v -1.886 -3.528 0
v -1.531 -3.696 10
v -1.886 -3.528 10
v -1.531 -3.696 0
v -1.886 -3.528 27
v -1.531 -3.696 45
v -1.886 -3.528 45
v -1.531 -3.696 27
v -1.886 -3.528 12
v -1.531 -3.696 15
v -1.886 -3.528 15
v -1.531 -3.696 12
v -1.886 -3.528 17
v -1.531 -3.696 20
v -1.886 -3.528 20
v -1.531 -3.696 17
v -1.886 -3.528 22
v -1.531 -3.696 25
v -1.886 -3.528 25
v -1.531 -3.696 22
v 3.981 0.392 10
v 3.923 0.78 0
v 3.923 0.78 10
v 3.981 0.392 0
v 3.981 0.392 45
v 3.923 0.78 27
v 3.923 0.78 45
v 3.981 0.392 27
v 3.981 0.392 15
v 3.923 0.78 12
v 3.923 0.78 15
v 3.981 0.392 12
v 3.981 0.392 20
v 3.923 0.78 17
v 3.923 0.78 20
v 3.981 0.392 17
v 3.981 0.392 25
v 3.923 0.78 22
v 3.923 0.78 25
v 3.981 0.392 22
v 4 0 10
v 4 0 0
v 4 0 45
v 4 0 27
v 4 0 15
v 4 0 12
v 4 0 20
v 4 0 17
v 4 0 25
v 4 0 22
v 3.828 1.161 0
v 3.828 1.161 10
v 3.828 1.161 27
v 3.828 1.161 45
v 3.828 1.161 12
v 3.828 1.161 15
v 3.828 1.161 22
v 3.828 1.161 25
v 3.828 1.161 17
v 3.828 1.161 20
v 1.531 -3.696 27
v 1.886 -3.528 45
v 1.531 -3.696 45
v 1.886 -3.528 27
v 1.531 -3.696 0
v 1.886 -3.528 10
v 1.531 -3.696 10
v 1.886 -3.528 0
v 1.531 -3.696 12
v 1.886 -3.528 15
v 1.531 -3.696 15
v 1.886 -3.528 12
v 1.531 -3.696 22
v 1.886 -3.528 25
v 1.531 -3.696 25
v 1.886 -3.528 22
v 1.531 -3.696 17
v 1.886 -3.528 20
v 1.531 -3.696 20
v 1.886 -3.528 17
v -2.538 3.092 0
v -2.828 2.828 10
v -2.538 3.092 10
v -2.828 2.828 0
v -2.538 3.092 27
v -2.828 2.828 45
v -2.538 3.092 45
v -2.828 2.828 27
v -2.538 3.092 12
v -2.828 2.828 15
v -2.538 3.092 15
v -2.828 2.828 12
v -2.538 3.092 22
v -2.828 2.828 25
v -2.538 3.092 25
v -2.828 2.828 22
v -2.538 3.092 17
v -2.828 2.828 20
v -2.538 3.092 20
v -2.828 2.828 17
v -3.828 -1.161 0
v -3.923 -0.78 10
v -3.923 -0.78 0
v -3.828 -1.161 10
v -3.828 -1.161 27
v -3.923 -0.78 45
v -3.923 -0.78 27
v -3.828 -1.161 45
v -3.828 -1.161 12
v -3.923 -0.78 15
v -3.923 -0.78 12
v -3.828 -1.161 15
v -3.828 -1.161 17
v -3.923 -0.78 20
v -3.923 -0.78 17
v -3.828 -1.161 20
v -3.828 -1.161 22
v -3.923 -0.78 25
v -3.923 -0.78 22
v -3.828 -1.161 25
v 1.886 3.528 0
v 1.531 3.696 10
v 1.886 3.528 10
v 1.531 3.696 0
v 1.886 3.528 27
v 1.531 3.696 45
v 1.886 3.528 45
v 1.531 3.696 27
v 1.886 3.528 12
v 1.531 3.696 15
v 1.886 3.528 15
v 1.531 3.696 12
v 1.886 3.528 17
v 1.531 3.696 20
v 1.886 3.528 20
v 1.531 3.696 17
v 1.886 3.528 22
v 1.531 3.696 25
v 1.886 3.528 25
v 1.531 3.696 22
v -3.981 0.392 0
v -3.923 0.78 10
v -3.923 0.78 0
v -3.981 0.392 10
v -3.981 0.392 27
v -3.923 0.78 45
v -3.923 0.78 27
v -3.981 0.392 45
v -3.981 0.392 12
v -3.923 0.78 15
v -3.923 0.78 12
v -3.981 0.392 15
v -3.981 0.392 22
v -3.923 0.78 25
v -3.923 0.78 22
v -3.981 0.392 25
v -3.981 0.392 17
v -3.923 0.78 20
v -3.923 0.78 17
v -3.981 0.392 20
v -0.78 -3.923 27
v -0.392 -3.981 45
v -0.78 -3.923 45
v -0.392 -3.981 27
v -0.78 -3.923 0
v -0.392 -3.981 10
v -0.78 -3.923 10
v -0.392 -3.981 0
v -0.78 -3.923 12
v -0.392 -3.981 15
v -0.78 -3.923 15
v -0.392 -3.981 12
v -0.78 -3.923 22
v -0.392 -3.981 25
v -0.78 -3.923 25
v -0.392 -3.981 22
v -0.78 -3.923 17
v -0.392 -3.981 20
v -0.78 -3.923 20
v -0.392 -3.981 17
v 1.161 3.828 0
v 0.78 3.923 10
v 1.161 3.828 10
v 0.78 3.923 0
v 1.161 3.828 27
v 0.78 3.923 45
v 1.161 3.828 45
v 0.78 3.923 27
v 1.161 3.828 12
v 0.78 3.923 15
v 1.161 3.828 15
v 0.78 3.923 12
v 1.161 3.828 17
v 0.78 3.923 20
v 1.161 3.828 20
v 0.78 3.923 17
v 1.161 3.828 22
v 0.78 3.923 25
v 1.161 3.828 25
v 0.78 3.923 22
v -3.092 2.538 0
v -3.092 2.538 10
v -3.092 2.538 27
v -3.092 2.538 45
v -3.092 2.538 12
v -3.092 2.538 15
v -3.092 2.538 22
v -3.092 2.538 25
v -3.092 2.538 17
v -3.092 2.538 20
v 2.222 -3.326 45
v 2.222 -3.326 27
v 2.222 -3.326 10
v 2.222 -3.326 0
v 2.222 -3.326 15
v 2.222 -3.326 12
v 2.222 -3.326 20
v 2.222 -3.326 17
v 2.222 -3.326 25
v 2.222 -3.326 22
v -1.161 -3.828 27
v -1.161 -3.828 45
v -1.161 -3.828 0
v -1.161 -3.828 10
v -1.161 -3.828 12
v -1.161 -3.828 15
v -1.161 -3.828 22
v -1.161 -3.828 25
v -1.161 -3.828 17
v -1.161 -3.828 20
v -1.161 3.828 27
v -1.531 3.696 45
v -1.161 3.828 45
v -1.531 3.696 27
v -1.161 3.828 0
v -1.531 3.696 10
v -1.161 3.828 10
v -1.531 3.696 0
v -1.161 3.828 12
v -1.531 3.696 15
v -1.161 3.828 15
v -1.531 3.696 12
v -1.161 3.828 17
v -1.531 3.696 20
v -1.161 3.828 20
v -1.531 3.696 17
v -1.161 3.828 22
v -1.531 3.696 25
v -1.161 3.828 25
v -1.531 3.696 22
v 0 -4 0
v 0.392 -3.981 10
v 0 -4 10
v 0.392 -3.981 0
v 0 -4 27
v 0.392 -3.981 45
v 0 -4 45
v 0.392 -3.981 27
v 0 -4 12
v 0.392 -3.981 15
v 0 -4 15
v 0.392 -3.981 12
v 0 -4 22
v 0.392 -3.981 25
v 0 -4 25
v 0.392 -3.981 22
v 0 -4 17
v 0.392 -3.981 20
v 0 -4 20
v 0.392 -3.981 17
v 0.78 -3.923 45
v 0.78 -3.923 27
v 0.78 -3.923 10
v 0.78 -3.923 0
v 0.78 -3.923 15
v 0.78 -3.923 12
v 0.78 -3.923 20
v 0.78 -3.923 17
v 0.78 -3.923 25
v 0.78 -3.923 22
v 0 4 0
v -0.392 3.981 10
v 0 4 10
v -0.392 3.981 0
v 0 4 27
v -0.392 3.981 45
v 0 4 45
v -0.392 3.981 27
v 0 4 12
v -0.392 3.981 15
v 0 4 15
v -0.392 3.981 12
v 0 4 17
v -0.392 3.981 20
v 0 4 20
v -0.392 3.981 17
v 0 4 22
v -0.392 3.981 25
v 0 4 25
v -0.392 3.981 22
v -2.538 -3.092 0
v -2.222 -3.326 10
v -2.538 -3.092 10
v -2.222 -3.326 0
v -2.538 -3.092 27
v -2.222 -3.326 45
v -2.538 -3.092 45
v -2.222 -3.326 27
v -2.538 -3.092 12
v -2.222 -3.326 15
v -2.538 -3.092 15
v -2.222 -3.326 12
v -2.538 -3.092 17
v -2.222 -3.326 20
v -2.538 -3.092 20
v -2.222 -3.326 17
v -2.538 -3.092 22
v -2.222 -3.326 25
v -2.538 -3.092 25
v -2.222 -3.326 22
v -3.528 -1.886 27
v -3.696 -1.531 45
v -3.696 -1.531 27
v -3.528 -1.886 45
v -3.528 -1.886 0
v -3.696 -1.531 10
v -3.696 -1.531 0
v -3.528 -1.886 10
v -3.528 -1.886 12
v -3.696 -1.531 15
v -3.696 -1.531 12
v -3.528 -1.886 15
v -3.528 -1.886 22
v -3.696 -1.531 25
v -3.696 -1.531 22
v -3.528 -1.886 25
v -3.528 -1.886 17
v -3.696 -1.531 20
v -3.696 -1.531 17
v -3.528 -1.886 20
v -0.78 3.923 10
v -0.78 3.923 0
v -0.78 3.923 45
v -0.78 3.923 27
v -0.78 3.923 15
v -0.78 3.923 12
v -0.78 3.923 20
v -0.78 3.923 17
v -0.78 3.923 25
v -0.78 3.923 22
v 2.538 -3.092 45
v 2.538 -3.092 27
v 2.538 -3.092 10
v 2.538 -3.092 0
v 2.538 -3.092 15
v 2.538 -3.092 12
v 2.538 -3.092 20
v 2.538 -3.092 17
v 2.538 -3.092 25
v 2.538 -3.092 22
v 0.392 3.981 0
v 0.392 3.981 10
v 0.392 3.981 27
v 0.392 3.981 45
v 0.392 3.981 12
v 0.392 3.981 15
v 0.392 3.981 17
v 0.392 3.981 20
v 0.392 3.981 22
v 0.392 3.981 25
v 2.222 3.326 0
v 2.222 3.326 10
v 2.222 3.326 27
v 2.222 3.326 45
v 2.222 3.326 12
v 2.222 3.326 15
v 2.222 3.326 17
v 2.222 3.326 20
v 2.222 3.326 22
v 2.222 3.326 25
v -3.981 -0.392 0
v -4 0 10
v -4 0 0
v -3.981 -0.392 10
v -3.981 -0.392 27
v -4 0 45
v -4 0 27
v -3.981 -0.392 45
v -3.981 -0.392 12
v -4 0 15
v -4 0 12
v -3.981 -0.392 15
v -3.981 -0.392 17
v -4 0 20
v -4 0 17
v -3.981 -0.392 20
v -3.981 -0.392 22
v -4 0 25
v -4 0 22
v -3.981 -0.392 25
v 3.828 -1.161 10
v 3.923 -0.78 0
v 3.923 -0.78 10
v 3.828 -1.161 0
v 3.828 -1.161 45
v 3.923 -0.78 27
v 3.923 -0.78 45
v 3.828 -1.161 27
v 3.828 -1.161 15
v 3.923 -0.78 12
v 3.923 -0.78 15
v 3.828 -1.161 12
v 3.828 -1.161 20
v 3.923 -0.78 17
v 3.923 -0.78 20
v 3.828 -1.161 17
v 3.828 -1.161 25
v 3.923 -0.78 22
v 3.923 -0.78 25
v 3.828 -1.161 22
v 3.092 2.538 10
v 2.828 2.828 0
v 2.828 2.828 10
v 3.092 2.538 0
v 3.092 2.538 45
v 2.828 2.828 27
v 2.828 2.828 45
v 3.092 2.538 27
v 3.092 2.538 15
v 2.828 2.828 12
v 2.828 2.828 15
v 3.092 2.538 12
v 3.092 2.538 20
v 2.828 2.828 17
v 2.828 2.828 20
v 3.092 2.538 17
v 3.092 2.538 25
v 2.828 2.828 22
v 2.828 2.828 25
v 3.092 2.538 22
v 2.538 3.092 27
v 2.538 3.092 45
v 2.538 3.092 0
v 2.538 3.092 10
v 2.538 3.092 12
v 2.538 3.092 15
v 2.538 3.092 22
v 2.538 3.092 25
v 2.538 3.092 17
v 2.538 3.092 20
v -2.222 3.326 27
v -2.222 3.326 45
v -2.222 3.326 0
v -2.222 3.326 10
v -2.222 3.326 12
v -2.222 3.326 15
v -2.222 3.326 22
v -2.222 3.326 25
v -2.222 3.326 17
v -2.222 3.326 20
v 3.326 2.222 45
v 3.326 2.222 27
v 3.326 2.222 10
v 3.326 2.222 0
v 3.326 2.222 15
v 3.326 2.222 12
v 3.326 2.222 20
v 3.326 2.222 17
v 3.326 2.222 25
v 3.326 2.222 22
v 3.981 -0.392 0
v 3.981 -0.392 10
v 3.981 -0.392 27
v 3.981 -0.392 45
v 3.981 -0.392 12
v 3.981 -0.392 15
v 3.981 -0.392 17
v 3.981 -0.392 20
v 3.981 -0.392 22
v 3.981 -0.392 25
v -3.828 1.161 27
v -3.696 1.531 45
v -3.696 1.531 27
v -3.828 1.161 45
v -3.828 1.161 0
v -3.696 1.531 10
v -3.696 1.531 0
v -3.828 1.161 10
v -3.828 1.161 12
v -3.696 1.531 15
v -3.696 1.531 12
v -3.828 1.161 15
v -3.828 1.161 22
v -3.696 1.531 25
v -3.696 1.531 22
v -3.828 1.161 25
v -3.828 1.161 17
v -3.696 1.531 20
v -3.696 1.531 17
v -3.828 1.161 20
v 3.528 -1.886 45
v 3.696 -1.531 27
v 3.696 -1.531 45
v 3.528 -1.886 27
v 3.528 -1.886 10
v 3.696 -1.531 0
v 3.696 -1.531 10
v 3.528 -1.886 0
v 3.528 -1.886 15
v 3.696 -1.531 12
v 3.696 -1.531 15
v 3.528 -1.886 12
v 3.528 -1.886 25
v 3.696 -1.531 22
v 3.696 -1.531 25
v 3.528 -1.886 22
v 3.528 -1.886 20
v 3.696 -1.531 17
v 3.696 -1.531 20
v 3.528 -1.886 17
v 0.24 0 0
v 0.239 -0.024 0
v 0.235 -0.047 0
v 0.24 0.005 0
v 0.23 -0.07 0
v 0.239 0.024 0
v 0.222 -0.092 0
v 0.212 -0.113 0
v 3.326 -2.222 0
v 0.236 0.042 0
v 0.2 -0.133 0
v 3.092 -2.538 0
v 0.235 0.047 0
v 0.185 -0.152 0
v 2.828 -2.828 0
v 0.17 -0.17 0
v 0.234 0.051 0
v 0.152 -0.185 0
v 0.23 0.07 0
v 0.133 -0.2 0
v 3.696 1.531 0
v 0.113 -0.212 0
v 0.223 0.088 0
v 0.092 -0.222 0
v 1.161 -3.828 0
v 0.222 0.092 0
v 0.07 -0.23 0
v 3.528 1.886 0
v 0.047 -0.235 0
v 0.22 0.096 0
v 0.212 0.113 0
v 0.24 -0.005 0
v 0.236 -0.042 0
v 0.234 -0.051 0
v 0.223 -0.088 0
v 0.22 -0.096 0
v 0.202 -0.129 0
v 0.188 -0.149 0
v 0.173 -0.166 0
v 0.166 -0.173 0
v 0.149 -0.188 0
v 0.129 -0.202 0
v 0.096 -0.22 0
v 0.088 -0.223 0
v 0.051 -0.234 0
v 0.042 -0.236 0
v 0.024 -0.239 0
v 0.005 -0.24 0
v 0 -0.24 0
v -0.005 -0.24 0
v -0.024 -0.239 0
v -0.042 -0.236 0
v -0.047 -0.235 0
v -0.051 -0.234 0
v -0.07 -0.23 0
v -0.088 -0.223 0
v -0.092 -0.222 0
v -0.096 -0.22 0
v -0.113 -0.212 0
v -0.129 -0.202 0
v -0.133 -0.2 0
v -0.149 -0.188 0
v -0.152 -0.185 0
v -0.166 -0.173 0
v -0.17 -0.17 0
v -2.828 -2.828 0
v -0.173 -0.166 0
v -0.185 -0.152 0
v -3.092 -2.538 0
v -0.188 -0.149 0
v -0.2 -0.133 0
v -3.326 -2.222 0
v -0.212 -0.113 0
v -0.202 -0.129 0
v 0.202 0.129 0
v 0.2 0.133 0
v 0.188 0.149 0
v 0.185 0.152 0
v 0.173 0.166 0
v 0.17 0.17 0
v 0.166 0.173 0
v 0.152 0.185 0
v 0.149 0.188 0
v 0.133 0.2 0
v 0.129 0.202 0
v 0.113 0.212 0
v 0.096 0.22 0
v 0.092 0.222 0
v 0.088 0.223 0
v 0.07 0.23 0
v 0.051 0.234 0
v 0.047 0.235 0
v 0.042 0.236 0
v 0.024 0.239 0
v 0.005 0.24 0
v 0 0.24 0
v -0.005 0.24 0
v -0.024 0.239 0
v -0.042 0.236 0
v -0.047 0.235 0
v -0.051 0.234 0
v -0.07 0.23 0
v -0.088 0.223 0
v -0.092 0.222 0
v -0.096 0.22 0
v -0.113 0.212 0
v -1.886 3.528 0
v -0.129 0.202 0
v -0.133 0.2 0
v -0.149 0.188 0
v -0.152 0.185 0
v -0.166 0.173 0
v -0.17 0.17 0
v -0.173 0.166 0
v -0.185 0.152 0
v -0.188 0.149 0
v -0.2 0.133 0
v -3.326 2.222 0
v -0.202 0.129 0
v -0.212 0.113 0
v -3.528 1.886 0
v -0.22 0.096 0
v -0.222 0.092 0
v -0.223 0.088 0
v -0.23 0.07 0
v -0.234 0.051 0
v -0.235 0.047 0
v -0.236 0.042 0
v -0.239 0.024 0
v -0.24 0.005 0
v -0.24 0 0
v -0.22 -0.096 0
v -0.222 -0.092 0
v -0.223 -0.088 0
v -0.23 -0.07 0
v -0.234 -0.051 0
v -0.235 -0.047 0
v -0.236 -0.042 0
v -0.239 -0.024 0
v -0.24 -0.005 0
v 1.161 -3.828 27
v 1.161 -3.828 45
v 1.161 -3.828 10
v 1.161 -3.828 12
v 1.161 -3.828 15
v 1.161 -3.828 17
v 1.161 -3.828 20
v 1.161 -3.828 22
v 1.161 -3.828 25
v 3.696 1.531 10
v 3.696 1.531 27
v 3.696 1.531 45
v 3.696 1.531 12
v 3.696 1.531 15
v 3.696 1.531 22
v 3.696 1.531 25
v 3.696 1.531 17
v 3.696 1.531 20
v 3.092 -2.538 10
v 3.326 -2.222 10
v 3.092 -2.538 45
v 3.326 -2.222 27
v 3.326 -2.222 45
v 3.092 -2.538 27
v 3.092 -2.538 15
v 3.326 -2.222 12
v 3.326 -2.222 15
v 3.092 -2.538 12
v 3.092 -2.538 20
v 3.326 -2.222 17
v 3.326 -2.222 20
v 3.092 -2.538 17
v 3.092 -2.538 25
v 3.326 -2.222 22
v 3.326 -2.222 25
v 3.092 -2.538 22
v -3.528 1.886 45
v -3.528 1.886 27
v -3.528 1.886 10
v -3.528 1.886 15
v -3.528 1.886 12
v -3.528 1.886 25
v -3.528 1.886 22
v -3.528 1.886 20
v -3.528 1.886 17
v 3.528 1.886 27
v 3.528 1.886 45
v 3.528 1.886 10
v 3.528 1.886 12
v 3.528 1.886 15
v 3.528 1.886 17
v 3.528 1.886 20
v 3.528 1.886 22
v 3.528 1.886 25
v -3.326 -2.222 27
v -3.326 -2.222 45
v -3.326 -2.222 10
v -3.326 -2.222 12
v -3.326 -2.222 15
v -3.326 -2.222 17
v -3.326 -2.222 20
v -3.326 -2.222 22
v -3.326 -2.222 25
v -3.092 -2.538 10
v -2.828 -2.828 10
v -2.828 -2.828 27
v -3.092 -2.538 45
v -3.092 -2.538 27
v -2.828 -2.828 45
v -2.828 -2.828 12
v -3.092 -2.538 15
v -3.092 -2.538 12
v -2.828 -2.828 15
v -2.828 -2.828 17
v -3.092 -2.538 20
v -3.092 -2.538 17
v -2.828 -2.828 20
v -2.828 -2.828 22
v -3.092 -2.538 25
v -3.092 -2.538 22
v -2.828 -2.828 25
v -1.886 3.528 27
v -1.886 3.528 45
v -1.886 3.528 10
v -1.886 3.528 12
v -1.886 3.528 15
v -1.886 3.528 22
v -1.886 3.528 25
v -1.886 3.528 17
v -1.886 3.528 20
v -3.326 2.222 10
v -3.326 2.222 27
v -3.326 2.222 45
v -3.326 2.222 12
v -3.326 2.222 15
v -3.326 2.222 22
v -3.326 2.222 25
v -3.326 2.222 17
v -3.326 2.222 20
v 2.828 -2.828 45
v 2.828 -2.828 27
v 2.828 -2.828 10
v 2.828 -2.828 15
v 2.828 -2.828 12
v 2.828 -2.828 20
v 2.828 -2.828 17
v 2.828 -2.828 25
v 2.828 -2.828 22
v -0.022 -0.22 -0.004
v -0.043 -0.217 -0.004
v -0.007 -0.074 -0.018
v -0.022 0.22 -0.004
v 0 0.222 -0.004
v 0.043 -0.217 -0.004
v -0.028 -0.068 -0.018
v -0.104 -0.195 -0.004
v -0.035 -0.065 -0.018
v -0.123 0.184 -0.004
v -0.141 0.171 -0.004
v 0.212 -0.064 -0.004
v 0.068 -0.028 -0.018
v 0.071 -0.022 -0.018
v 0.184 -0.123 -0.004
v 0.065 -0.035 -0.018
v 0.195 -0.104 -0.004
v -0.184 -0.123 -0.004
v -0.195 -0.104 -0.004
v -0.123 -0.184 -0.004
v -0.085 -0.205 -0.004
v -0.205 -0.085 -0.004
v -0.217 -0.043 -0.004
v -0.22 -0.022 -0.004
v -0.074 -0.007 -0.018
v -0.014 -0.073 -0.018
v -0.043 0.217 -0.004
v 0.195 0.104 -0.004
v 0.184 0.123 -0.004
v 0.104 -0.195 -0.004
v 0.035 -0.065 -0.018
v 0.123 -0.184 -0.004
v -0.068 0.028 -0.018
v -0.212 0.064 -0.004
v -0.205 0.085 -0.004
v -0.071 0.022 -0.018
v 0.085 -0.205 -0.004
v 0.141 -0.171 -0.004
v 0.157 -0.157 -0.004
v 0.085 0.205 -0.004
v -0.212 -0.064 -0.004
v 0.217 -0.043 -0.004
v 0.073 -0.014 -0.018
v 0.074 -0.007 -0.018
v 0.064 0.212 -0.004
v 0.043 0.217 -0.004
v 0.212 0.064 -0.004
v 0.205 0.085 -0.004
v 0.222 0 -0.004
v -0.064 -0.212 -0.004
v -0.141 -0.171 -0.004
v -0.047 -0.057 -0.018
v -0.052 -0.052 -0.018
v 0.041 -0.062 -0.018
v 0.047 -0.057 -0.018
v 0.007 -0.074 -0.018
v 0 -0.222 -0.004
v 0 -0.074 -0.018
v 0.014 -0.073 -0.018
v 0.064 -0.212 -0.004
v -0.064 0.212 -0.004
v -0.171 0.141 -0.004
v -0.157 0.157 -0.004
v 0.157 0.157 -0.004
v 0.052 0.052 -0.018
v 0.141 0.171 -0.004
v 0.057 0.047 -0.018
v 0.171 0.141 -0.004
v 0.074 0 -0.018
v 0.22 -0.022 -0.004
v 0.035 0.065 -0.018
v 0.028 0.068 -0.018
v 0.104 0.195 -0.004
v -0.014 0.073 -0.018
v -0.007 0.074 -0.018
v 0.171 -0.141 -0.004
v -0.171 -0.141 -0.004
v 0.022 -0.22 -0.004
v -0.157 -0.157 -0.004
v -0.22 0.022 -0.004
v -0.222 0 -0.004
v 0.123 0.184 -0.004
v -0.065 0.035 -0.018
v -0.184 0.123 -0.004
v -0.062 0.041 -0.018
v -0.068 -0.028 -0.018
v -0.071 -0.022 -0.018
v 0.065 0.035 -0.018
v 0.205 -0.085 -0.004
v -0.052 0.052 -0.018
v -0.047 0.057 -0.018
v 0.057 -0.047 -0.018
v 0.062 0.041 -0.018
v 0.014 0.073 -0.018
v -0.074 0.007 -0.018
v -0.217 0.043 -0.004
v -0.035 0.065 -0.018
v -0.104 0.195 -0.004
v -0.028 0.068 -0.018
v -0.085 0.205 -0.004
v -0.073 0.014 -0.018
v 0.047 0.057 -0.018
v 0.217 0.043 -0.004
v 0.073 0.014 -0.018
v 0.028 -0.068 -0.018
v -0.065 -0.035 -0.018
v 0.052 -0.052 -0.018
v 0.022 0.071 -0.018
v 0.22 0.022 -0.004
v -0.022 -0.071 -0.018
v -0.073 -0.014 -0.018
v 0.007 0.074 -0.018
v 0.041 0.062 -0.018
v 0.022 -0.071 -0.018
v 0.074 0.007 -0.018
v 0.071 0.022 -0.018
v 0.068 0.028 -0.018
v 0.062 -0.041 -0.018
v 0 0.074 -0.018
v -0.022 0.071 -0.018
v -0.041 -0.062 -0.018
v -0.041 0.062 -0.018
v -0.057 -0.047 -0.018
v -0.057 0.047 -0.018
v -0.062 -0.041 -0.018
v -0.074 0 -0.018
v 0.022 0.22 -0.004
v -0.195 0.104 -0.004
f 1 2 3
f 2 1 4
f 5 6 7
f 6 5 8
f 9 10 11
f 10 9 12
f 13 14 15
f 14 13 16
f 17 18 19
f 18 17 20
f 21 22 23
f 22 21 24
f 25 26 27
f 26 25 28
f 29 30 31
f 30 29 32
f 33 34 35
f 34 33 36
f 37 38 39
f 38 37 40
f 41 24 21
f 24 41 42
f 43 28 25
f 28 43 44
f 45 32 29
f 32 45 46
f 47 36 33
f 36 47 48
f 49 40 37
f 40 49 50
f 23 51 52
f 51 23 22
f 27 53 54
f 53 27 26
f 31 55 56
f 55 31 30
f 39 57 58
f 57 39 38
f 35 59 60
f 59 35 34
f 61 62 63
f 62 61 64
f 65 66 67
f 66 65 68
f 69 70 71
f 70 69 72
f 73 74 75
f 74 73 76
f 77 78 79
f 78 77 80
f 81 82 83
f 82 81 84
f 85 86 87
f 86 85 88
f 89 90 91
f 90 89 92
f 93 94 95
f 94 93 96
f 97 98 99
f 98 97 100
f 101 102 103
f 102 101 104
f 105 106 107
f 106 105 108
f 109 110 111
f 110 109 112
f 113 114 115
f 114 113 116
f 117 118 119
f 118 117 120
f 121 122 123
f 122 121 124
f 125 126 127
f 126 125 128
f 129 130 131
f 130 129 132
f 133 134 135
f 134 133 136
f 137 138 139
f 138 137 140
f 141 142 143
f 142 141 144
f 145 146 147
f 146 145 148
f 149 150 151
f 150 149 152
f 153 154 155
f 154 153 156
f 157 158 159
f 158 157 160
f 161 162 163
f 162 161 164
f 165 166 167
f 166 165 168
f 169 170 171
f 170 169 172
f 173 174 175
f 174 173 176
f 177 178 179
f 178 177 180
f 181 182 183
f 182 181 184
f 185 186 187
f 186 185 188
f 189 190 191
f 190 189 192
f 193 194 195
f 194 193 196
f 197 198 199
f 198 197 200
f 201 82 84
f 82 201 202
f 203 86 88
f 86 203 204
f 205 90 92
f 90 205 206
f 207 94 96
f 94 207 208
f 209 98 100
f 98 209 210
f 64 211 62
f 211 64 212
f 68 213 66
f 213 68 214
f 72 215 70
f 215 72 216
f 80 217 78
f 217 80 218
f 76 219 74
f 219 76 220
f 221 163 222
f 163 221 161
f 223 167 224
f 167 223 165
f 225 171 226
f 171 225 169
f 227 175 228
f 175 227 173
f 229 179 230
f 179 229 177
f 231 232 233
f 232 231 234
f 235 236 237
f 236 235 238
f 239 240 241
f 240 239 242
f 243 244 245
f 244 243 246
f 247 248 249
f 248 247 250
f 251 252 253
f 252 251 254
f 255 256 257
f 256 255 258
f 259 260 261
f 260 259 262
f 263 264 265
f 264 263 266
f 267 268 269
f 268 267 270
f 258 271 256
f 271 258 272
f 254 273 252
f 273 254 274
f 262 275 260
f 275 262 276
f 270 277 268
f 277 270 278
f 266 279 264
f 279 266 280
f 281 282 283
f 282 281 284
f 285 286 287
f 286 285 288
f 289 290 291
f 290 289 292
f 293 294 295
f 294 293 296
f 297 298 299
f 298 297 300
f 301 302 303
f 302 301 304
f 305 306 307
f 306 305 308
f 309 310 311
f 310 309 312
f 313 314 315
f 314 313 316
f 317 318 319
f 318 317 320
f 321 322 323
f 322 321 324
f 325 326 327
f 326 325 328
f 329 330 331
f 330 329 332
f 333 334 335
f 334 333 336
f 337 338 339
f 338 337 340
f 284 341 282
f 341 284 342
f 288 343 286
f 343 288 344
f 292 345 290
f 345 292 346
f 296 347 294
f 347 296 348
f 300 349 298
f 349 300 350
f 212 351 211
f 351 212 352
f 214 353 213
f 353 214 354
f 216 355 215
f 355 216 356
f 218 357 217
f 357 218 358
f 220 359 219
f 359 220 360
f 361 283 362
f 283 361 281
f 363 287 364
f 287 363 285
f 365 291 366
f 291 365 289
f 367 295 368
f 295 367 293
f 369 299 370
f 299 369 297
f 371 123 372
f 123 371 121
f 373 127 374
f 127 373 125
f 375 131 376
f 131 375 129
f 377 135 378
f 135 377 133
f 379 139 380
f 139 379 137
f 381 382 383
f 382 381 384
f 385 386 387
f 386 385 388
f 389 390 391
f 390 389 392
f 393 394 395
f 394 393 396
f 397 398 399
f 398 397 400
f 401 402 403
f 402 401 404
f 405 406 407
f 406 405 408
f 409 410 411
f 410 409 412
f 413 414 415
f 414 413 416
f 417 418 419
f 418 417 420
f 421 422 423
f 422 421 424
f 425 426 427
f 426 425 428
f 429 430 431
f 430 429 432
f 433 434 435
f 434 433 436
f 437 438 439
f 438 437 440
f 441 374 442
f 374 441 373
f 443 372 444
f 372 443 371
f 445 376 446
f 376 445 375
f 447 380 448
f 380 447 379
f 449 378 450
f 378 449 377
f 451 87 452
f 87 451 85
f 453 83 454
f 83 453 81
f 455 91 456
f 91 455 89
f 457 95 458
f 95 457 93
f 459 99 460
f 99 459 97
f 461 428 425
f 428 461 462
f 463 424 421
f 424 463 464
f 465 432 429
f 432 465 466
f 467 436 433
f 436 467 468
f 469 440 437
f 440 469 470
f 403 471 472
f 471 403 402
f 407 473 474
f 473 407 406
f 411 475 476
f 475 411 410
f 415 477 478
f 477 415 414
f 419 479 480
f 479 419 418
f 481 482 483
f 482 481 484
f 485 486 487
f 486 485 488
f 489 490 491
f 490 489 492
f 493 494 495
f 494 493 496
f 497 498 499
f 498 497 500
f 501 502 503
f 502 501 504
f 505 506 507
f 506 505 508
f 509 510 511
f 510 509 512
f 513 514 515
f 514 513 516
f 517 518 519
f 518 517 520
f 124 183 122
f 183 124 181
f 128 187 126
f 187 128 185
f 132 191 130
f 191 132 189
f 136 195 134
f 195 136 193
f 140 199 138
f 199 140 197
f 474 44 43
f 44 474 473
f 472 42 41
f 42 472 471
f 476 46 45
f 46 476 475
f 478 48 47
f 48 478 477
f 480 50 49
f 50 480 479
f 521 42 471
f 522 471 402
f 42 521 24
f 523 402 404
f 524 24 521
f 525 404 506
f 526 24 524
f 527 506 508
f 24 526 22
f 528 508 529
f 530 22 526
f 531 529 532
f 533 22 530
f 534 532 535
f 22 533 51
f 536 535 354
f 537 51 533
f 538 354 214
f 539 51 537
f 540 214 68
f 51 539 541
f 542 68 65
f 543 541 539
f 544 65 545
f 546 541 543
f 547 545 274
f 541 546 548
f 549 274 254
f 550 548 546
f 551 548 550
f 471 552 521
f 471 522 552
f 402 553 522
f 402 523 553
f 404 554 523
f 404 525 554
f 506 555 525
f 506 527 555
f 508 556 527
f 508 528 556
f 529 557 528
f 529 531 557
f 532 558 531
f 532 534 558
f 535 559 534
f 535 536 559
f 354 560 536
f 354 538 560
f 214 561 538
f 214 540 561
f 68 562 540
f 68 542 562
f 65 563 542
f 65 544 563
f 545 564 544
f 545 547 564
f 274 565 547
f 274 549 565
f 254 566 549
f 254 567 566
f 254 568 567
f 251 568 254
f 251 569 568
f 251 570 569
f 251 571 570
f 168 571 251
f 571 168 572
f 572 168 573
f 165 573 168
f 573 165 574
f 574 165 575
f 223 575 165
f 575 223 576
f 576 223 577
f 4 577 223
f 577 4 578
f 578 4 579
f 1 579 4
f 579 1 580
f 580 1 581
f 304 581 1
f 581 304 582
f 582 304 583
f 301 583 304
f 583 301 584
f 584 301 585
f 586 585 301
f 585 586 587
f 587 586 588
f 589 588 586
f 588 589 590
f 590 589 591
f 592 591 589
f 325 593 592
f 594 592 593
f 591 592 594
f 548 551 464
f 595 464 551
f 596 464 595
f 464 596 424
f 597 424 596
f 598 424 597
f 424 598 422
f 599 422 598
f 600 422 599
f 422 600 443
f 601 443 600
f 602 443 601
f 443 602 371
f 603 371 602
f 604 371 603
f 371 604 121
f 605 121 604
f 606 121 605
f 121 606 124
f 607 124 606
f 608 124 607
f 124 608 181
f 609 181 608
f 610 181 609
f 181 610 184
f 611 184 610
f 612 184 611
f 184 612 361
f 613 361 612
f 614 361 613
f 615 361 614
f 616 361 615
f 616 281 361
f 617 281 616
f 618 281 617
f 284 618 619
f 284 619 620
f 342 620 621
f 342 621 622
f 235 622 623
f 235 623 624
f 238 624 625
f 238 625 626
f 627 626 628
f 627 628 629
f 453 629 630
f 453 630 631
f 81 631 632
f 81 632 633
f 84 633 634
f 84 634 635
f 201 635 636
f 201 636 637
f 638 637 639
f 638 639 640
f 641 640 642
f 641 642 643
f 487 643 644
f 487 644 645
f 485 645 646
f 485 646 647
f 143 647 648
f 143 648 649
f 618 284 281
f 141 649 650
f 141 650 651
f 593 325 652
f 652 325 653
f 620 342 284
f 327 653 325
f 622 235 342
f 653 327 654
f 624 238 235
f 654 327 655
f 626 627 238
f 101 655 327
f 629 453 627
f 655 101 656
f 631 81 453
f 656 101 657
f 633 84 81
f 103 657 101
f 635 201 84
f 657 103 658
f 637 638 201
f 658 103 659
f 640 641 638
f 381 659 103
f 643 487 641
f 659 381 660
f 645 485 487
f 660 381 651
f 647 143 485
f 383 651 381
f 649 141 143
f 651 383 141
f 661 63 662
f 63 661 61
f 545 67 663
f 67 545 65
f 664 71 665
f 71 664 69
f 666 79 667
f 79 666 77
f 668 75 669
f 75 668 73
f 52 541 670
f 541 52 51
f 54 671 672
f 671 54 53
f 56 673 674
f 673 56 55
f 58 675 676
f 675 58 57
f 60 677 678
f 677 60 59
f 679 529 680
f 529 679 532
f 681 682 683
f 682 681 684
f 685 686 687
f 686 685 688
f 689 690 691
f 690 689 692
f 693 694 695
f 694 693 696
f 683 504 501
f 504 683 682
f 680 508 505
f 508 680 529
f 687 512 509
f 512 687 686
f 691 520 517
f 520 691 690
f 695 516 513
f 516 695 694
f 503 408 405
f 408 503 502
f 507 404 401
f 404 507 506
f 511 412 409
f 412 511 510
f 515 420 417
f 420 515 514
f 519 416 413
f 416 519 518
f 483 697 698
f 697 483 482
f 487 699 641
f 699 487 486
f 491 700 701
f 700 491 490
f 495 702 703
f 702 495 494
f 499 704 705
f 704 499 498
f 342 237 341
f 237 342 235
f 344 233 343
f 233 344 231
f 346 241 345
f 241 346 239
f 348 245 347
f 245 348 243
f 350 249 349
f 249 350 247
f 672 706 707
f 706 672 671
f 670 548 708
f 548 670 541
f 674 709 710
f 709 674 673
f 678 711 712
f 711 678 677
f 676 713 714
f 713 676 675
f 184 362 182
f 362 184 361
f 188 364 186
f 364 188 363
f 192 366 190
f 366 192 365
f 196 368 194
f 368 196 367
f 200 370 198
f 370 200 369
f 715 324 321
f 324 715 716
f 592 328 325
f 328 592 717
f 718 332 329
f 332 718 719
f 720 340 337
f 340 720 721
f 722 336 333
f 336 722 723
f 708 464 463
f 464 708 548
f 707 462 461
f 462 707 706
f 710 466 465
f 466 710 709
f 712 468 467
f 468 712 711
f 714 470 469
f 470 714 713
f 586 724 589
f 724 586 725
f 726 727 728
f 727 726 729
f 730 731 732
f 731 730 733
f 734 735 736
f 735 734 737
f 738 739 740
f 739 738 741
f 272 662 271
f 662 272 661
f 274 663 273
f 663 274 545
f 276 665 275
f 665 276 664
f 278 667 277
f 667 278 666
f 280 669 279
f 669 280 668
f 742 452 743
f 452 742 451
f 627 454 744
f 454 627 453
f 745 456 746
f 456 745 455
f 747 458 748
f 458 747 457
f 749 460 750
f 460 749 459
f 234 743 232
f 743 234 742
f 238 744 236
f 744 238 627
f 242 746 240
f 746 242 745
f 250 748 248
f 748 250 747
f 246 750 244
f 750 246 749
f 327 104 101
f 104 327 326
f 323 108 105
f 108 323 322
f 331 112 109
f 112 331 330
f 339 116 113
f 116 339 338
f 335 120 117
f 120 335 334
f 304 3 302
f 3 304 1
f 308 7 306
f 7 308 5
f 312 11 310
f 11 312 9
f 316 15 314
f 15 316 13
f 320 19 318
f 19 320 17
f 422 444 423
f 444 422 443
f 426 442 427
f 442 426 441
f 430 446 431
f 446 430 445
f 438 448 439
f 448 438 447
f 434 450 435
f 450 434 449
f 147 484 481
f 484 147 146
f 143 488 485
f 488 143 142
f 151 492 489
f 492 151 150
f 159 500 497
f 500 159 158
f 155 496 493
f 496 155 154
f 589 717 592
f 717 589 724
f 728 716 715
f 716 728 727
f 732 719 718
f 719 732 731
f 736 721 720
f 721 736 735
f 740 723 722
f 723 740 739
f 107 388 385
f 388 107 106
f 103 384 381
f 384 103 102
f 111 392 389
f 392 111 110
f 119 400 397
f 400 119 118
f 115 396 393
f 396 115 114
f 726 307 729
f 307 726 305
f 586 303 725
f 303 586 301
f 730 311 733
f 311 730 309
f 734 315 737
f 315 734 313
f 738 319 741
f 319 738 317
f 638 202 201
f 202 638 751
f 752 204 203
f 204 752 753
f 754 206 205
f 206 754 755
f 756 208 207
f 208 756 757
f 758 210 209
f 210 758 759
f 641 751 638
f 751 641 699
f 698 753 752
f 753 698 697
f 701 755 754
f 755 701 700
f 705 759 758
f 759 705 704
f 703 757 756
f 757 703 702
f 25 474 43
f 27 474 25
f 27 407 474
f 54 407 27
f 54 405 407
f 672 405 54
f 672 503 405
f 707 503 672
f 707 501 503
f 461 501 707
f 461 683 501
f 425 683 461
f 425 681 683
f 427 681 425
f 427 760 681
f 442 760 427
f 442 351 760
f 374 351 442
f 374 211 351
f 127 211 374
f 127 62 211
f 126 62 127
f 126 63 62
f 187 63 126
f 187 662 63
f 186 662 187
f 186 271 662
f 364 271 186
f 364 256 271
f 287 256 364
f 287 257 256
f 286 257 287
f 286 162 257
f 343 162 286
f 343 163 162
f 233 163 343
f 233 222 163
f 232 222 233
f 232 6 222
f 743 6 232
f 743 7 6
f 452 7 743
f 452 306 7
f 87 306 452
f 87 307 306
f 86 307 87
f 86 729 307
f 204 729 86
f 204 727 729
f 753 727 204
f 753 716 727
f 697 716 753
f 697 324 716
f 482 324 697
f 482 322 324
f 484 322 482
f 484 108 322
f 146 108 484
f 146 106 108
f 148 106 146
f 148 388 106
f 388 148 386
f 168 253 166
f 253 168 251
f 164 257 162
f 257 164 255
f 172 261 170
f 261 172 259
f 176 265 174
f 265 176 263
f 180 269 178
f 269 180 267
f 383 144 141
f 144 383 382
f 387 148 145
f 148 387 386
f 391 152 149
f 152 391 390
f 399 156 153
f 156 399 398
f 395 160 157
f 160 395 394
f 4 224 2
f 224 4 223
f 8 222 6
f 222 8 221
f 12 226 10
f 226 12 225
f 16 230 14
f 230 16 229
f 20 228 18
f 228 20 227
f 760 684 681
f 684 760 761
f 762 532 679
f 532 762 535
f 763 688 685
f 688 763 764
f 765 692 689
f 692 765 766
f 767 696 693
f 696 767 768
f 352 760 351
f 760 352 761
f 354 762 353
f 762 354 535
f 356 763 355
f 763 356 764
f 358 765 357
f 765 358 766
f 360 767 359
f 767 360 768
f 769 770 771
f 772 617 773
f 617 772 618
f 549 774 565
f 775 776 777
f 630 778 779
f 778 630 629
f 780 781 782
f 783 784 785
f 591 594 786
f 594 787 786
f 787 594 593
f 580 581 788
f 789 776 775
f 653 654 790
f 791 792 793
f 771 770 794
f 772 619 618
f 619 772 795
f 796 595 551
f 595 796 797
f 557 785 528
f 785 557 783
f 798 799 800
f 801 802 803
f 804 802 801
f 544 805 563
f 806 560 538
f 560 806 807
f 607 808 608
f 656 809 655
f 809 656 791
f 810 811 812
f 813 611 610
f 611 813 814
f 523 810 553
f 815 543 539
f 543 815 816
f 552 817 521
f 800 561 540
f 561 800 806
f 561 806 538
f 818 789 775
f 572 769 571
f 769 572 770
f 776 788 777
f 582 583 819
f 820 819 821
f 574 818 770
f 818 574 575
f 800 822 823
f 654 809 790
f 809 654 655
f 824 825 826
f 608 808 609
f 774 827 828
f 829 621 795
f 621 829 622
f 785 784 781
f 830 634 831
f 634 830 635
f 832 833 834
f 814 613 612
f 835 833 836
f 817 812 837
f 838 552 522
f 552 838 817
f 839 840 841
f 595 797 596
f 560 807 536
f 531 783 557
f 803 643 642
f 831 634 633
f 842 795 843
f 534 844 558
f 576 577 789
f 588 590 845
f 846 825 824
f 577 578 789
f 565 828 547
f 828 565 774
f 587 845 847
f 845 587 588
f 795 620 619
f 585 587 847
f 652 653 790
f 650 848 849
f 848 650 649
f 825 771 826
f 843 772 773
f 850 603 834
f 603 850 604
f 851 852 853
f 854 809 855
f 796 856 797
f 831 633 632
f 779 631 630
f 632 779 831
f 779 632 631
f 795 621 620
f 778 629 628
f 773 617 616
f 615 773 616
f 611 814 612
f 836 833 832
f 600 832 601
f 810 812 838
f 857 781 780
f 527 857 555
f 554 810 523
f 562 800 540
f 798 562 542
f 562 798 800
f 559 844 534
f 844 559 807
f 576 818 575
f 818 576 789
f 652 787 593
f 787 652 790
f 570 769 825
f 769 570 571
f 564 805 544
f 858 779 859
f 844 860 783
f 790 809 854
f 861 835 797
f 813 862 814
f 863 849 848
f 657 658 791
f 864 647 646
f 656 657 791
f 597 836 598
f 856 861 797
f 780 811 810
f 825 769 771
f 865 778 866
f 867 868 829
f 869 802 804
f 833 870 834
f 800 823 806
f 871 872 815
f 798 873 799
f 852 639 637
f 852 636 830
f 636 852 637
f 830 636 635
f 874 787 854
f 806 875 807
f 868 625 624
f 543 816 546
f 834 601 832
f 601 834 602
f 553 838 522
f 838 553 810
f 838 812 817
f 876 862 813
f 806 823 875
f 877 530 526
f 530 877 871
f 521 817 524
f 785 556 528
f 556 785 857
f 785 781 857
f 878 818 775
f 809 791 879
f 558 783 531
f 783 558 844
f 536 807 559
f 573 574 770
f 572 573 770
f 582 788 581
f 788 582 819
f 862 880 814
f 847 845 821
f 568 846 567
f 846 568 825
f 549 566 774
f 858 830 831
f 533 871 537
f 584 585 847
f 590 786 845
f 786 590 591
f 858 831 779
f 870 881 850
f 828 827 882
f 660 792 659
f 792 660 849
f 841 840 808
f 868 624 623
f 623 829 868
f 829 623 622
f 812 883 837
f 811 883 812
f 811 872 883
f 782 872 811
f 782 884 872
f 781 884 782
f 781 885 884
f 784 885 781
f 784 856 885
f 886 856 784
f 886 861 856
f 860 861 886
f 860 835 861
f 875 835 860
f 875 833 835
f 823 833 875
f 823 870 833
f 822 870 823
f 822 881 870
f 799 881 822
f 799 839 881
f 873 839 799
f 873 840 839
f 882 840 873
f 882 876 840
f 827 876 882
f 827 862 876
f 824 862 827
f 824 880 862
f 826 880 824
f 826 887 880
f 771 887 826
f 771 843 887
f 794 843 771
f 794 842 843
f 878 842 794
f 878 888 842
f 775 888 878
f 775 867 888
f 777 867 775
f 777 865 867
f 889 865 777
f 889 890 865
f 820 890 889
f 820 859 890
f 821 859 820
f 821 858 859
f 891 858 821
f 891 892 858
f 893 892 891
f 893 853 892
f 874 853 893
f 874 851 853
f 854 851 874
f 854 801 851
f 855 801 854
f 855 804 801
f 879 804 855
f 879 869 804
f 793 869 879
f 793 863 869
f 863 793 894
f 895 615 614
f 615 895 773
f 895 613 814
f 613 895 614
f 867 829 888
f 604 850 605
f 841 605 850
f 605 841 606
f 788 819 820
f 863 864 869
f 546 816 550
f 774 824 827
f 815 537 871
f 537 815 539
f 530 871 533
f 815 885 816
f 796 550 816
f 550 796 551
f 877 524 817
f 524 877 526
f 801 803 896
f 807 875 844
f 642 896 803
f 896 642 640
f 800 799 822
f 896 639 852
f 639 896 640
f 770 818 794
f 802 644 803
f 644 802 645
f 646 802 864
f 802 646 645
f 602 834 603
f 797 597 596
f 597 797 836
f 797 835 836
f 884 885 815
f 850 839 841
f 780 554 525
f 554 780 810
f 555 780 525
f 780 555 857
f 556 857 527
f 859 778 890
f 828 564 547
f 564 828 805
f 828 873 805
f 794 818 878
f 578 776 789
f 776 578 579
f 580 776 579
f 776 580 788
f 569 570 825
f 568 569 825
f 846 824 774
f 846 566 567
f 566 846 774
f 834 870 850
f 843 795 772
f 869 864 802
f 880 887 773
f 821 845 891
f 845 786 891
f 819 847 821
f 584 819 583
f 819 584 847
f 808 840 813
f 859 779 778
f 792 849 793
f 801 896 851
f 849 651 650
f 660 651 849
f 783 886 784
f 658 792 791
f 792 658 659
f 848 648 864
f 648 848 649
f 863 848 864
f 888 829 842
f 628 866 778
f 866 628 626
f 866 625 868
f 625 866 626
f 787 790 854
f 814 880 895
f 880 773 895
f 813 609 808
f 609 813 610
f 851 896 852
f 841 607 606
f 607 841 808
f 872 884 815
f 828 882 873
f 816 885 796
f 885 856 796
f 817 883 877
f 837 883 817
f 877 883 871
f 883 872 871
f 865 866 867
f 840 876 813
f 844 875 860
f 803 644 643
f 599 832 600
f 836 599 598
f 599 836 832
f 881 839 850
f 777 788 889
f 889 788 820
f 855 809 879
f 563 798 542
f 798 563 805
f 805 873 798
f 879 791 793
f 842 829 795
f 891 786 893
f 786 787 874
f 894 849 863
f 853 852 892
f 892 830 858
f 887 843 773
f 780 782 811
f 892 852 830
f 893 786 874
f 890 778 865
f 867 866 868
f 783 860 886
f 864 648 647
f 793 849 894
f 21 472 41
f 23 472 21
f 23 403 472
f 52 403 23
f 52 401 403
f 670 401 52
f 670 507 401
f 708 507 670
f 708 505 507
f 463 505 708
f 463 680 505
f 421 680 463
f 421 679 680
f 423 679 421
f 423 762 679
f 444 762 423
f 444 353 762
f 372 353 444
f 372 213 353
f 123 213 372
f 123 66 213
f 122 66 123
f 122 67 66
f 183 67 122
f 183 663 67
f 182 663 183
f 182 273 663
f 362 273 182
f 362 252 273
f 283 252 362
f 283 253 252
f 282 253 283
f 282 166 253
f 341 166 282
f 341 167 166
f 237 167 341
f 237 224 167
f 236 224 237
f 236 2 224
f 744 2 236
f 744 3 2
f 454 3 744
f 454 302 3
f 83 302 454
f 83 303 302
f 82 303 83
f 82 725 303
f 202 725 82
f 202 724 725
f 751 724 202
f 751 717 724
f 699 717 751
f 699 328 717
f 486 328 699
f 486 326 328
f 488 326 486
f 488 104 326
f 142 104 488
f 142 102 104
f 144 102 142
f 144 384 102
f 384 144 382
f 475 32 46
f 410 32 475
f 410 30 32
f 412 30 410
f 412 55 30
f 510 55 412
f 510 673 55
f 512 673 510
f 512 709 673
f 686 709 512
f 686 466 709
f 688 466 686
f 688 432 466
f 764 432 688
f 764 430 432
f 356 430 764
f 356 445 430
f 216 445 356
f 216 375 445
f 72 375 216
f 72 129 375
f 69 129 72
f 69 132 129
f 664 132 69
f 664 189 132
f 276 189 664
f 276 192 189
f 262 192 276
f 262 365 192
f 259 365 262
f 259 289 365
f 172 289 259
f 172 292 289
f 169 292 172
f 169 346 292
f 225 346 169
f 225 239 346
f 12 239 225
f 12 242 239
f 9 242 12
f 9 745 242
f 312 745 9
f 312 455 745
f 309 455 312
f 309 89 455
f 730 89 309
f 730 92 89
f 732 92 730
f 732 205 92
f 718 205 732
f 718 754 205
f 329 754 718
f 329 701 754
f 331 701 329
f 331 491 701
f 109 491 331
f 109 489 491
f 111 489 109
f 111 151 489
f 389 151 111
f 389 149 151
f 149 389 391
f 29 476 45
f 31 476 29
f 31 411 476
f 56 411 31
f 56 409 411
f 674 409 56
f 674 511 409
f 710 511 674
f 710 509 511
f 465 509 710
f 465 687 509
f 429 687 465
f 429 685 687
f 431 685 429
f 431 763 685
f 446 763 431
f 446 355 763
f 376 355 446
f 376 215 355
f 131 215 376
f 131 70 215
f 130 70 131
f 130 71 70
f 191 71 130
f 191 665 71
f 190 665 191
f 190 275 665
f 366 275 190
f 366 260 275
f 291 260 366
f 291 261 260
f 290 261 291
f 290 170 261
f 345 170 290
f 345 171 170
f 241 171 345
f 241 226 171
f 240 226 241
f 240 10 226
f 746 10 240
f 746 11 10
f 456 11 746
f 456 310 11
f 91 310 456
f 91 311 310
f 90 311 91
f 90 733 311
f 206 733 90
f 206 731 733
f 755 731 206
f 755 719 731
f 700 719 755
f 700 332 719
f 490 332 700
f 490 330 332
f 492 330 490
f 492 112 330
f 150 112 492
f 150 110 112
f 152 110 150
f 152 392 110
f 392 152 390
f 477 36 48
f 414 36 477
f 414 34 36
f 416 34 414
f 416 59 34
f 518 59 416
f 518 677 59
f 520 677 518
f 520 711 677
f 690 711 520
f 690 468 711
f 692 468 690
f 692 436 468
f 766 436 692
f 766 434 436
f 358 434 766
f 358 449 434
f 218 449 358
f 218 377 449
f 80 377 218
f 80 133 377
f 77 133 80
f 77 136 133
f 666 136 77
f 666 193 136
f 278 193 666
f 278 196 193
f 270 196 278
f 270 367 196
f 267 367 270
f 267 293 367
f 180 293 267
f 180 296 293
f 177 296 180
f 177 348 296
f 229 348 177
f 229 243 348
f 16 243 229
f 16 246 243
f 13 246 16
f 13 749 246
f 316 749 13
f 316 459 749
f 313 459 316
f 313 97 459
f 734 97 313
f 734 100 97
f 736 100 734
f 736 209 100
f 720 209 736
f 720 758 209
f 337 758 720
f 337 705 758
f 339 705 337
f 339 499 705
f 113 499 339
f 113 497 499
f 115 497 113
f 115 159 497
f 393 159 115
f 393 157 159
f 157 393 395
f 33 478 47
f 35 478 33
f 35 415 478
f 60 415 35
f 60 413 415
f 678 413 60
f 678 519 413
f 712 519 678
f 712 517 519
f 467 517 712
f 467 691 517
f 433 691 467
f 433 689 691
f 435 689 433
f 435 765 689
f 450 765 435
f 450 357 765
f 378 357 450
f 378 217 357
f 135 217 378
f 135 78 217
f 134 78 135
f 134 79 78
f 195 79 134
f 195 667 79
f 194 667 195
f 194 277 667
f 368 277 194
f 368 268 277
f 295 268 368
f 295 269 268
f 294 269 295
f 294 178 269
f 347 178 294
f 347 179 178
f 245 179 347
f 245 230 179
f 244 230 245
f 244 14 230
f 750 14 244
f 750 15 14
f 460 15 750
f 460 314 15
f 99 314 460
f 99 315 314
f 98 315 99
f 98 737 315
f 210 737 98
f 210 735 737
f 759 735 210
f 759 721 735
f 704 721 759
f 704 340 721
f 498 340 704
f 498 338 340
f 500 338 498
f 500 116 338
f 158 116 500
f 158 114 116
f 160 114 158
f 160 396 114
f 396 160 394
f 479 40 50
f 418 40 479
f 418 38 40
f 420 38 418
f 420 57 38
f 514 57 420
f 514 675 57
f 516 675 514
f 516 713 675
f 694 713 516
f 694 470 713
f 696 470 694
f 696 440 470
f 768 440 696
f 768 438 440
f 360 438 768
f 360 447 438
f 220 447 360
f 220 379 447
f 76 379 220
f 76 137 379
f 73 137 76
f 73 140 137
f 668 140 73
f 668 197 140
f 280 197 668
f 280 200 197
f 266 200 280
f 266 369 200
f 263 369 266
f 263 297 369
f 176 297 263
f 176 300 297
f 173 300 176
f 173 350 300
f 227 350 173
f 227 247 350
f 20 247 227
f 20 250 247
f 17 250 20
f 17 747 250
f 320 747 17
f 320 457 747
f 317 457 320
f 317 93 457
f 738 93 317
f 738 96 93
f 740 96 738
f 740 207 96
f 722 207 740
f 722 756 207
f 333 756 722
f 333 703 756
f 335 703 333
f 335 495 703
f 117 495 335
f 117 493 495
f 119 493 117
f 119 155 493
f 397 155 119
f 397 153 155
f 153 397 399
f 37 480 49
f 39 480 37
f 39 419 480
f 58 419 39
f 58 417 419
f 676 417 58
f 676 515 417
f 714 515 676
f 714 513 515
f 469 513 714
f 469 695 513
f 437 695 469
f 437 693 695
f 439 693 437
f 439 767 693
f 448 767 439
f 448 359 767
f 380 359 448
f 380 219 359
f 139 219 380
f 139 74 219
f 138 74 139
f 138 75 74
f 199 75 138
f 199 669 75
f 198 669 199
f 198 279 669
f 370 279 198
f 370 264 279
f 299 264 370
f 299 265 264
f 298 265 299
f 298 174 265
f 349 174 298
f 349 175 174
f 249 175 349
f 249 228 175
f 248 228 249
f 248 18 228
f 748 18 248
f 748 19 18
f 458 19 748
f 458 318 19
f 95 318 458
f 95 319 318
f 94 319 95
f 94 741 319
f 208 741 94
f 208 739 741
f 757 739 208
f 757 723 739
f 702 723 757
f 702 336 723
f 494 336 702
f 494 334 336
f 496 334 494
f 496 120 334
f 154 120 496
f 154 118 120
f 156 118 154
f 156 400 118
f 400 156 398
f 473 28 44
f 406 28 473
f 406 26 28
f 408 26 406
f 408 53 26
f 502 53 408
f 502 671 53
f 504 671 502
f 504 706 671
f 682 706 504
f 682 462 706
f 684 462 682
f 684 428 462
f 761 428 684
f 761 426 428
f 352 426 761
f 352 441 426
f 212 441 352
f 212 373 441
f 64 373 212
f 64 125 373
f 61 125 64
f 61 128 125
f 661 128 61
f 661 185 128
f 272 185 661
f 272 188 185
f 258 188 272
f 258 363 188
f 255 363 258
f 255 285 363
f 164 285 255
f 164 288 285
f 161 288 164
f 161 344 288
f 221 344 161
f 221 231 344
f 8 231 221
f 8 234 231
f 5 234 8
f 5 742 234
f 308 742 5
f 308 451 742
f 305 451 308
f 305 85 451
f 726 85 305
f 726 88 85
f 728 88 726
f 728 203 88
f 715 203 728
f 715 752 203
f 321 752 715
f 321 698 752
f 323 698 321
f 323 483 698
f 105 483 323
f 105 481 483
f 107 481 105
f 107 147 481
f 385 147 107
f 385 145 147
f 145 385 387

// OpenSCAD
// Tissue pestle for 1.5 mL microcentrifuge tube
// Print orientation: standing upright on the bed (z = 0)

$fn = 64;

// ---- Dimensions (mm) ----
handle_d      = 8;    // handle diameter
handle_h      = 45;   // handle height (z = 0 to 45)
cone_d_bottom = 8;    // cone diameter at z = 45
cone_d_top    = 3;    // cone diameter at z = 62
tip_d         = 3;    // sphere diameter (centred at z = 62)
groove_w      = 2;    // circumferential groove width (Z)
groove_depth  = 1;    // groove depth into handle
groove_z      = [10, 15, 20, 25]; // groove centre heights

eps = 0.5;            // overshoot for clean boolean cuts

// ---- Model ----
difference() {
    union() {
        // Handle
        cylinder(d = handle_d, h = handle_h);
        // Cone (slightly overlaps handle for a solid union)
        translate([0, 0, handle_h - 0.01])
            cylinder(d1 = cone_d_bottom, d2 = cone_d_top, h = cone_d_top - handle_h + 0.01);
        // Rounded tip
        translate([0, 0, tip_d / 2 - 0.01])
            sphere(d = tip_d + 0.02);
    }
    // Grip grooves
    for (z = groove_z)
        translate([0, 0, z])
            cylinder(d = handle_d, h = groove_w, depth = groove_depth + eps);
}
